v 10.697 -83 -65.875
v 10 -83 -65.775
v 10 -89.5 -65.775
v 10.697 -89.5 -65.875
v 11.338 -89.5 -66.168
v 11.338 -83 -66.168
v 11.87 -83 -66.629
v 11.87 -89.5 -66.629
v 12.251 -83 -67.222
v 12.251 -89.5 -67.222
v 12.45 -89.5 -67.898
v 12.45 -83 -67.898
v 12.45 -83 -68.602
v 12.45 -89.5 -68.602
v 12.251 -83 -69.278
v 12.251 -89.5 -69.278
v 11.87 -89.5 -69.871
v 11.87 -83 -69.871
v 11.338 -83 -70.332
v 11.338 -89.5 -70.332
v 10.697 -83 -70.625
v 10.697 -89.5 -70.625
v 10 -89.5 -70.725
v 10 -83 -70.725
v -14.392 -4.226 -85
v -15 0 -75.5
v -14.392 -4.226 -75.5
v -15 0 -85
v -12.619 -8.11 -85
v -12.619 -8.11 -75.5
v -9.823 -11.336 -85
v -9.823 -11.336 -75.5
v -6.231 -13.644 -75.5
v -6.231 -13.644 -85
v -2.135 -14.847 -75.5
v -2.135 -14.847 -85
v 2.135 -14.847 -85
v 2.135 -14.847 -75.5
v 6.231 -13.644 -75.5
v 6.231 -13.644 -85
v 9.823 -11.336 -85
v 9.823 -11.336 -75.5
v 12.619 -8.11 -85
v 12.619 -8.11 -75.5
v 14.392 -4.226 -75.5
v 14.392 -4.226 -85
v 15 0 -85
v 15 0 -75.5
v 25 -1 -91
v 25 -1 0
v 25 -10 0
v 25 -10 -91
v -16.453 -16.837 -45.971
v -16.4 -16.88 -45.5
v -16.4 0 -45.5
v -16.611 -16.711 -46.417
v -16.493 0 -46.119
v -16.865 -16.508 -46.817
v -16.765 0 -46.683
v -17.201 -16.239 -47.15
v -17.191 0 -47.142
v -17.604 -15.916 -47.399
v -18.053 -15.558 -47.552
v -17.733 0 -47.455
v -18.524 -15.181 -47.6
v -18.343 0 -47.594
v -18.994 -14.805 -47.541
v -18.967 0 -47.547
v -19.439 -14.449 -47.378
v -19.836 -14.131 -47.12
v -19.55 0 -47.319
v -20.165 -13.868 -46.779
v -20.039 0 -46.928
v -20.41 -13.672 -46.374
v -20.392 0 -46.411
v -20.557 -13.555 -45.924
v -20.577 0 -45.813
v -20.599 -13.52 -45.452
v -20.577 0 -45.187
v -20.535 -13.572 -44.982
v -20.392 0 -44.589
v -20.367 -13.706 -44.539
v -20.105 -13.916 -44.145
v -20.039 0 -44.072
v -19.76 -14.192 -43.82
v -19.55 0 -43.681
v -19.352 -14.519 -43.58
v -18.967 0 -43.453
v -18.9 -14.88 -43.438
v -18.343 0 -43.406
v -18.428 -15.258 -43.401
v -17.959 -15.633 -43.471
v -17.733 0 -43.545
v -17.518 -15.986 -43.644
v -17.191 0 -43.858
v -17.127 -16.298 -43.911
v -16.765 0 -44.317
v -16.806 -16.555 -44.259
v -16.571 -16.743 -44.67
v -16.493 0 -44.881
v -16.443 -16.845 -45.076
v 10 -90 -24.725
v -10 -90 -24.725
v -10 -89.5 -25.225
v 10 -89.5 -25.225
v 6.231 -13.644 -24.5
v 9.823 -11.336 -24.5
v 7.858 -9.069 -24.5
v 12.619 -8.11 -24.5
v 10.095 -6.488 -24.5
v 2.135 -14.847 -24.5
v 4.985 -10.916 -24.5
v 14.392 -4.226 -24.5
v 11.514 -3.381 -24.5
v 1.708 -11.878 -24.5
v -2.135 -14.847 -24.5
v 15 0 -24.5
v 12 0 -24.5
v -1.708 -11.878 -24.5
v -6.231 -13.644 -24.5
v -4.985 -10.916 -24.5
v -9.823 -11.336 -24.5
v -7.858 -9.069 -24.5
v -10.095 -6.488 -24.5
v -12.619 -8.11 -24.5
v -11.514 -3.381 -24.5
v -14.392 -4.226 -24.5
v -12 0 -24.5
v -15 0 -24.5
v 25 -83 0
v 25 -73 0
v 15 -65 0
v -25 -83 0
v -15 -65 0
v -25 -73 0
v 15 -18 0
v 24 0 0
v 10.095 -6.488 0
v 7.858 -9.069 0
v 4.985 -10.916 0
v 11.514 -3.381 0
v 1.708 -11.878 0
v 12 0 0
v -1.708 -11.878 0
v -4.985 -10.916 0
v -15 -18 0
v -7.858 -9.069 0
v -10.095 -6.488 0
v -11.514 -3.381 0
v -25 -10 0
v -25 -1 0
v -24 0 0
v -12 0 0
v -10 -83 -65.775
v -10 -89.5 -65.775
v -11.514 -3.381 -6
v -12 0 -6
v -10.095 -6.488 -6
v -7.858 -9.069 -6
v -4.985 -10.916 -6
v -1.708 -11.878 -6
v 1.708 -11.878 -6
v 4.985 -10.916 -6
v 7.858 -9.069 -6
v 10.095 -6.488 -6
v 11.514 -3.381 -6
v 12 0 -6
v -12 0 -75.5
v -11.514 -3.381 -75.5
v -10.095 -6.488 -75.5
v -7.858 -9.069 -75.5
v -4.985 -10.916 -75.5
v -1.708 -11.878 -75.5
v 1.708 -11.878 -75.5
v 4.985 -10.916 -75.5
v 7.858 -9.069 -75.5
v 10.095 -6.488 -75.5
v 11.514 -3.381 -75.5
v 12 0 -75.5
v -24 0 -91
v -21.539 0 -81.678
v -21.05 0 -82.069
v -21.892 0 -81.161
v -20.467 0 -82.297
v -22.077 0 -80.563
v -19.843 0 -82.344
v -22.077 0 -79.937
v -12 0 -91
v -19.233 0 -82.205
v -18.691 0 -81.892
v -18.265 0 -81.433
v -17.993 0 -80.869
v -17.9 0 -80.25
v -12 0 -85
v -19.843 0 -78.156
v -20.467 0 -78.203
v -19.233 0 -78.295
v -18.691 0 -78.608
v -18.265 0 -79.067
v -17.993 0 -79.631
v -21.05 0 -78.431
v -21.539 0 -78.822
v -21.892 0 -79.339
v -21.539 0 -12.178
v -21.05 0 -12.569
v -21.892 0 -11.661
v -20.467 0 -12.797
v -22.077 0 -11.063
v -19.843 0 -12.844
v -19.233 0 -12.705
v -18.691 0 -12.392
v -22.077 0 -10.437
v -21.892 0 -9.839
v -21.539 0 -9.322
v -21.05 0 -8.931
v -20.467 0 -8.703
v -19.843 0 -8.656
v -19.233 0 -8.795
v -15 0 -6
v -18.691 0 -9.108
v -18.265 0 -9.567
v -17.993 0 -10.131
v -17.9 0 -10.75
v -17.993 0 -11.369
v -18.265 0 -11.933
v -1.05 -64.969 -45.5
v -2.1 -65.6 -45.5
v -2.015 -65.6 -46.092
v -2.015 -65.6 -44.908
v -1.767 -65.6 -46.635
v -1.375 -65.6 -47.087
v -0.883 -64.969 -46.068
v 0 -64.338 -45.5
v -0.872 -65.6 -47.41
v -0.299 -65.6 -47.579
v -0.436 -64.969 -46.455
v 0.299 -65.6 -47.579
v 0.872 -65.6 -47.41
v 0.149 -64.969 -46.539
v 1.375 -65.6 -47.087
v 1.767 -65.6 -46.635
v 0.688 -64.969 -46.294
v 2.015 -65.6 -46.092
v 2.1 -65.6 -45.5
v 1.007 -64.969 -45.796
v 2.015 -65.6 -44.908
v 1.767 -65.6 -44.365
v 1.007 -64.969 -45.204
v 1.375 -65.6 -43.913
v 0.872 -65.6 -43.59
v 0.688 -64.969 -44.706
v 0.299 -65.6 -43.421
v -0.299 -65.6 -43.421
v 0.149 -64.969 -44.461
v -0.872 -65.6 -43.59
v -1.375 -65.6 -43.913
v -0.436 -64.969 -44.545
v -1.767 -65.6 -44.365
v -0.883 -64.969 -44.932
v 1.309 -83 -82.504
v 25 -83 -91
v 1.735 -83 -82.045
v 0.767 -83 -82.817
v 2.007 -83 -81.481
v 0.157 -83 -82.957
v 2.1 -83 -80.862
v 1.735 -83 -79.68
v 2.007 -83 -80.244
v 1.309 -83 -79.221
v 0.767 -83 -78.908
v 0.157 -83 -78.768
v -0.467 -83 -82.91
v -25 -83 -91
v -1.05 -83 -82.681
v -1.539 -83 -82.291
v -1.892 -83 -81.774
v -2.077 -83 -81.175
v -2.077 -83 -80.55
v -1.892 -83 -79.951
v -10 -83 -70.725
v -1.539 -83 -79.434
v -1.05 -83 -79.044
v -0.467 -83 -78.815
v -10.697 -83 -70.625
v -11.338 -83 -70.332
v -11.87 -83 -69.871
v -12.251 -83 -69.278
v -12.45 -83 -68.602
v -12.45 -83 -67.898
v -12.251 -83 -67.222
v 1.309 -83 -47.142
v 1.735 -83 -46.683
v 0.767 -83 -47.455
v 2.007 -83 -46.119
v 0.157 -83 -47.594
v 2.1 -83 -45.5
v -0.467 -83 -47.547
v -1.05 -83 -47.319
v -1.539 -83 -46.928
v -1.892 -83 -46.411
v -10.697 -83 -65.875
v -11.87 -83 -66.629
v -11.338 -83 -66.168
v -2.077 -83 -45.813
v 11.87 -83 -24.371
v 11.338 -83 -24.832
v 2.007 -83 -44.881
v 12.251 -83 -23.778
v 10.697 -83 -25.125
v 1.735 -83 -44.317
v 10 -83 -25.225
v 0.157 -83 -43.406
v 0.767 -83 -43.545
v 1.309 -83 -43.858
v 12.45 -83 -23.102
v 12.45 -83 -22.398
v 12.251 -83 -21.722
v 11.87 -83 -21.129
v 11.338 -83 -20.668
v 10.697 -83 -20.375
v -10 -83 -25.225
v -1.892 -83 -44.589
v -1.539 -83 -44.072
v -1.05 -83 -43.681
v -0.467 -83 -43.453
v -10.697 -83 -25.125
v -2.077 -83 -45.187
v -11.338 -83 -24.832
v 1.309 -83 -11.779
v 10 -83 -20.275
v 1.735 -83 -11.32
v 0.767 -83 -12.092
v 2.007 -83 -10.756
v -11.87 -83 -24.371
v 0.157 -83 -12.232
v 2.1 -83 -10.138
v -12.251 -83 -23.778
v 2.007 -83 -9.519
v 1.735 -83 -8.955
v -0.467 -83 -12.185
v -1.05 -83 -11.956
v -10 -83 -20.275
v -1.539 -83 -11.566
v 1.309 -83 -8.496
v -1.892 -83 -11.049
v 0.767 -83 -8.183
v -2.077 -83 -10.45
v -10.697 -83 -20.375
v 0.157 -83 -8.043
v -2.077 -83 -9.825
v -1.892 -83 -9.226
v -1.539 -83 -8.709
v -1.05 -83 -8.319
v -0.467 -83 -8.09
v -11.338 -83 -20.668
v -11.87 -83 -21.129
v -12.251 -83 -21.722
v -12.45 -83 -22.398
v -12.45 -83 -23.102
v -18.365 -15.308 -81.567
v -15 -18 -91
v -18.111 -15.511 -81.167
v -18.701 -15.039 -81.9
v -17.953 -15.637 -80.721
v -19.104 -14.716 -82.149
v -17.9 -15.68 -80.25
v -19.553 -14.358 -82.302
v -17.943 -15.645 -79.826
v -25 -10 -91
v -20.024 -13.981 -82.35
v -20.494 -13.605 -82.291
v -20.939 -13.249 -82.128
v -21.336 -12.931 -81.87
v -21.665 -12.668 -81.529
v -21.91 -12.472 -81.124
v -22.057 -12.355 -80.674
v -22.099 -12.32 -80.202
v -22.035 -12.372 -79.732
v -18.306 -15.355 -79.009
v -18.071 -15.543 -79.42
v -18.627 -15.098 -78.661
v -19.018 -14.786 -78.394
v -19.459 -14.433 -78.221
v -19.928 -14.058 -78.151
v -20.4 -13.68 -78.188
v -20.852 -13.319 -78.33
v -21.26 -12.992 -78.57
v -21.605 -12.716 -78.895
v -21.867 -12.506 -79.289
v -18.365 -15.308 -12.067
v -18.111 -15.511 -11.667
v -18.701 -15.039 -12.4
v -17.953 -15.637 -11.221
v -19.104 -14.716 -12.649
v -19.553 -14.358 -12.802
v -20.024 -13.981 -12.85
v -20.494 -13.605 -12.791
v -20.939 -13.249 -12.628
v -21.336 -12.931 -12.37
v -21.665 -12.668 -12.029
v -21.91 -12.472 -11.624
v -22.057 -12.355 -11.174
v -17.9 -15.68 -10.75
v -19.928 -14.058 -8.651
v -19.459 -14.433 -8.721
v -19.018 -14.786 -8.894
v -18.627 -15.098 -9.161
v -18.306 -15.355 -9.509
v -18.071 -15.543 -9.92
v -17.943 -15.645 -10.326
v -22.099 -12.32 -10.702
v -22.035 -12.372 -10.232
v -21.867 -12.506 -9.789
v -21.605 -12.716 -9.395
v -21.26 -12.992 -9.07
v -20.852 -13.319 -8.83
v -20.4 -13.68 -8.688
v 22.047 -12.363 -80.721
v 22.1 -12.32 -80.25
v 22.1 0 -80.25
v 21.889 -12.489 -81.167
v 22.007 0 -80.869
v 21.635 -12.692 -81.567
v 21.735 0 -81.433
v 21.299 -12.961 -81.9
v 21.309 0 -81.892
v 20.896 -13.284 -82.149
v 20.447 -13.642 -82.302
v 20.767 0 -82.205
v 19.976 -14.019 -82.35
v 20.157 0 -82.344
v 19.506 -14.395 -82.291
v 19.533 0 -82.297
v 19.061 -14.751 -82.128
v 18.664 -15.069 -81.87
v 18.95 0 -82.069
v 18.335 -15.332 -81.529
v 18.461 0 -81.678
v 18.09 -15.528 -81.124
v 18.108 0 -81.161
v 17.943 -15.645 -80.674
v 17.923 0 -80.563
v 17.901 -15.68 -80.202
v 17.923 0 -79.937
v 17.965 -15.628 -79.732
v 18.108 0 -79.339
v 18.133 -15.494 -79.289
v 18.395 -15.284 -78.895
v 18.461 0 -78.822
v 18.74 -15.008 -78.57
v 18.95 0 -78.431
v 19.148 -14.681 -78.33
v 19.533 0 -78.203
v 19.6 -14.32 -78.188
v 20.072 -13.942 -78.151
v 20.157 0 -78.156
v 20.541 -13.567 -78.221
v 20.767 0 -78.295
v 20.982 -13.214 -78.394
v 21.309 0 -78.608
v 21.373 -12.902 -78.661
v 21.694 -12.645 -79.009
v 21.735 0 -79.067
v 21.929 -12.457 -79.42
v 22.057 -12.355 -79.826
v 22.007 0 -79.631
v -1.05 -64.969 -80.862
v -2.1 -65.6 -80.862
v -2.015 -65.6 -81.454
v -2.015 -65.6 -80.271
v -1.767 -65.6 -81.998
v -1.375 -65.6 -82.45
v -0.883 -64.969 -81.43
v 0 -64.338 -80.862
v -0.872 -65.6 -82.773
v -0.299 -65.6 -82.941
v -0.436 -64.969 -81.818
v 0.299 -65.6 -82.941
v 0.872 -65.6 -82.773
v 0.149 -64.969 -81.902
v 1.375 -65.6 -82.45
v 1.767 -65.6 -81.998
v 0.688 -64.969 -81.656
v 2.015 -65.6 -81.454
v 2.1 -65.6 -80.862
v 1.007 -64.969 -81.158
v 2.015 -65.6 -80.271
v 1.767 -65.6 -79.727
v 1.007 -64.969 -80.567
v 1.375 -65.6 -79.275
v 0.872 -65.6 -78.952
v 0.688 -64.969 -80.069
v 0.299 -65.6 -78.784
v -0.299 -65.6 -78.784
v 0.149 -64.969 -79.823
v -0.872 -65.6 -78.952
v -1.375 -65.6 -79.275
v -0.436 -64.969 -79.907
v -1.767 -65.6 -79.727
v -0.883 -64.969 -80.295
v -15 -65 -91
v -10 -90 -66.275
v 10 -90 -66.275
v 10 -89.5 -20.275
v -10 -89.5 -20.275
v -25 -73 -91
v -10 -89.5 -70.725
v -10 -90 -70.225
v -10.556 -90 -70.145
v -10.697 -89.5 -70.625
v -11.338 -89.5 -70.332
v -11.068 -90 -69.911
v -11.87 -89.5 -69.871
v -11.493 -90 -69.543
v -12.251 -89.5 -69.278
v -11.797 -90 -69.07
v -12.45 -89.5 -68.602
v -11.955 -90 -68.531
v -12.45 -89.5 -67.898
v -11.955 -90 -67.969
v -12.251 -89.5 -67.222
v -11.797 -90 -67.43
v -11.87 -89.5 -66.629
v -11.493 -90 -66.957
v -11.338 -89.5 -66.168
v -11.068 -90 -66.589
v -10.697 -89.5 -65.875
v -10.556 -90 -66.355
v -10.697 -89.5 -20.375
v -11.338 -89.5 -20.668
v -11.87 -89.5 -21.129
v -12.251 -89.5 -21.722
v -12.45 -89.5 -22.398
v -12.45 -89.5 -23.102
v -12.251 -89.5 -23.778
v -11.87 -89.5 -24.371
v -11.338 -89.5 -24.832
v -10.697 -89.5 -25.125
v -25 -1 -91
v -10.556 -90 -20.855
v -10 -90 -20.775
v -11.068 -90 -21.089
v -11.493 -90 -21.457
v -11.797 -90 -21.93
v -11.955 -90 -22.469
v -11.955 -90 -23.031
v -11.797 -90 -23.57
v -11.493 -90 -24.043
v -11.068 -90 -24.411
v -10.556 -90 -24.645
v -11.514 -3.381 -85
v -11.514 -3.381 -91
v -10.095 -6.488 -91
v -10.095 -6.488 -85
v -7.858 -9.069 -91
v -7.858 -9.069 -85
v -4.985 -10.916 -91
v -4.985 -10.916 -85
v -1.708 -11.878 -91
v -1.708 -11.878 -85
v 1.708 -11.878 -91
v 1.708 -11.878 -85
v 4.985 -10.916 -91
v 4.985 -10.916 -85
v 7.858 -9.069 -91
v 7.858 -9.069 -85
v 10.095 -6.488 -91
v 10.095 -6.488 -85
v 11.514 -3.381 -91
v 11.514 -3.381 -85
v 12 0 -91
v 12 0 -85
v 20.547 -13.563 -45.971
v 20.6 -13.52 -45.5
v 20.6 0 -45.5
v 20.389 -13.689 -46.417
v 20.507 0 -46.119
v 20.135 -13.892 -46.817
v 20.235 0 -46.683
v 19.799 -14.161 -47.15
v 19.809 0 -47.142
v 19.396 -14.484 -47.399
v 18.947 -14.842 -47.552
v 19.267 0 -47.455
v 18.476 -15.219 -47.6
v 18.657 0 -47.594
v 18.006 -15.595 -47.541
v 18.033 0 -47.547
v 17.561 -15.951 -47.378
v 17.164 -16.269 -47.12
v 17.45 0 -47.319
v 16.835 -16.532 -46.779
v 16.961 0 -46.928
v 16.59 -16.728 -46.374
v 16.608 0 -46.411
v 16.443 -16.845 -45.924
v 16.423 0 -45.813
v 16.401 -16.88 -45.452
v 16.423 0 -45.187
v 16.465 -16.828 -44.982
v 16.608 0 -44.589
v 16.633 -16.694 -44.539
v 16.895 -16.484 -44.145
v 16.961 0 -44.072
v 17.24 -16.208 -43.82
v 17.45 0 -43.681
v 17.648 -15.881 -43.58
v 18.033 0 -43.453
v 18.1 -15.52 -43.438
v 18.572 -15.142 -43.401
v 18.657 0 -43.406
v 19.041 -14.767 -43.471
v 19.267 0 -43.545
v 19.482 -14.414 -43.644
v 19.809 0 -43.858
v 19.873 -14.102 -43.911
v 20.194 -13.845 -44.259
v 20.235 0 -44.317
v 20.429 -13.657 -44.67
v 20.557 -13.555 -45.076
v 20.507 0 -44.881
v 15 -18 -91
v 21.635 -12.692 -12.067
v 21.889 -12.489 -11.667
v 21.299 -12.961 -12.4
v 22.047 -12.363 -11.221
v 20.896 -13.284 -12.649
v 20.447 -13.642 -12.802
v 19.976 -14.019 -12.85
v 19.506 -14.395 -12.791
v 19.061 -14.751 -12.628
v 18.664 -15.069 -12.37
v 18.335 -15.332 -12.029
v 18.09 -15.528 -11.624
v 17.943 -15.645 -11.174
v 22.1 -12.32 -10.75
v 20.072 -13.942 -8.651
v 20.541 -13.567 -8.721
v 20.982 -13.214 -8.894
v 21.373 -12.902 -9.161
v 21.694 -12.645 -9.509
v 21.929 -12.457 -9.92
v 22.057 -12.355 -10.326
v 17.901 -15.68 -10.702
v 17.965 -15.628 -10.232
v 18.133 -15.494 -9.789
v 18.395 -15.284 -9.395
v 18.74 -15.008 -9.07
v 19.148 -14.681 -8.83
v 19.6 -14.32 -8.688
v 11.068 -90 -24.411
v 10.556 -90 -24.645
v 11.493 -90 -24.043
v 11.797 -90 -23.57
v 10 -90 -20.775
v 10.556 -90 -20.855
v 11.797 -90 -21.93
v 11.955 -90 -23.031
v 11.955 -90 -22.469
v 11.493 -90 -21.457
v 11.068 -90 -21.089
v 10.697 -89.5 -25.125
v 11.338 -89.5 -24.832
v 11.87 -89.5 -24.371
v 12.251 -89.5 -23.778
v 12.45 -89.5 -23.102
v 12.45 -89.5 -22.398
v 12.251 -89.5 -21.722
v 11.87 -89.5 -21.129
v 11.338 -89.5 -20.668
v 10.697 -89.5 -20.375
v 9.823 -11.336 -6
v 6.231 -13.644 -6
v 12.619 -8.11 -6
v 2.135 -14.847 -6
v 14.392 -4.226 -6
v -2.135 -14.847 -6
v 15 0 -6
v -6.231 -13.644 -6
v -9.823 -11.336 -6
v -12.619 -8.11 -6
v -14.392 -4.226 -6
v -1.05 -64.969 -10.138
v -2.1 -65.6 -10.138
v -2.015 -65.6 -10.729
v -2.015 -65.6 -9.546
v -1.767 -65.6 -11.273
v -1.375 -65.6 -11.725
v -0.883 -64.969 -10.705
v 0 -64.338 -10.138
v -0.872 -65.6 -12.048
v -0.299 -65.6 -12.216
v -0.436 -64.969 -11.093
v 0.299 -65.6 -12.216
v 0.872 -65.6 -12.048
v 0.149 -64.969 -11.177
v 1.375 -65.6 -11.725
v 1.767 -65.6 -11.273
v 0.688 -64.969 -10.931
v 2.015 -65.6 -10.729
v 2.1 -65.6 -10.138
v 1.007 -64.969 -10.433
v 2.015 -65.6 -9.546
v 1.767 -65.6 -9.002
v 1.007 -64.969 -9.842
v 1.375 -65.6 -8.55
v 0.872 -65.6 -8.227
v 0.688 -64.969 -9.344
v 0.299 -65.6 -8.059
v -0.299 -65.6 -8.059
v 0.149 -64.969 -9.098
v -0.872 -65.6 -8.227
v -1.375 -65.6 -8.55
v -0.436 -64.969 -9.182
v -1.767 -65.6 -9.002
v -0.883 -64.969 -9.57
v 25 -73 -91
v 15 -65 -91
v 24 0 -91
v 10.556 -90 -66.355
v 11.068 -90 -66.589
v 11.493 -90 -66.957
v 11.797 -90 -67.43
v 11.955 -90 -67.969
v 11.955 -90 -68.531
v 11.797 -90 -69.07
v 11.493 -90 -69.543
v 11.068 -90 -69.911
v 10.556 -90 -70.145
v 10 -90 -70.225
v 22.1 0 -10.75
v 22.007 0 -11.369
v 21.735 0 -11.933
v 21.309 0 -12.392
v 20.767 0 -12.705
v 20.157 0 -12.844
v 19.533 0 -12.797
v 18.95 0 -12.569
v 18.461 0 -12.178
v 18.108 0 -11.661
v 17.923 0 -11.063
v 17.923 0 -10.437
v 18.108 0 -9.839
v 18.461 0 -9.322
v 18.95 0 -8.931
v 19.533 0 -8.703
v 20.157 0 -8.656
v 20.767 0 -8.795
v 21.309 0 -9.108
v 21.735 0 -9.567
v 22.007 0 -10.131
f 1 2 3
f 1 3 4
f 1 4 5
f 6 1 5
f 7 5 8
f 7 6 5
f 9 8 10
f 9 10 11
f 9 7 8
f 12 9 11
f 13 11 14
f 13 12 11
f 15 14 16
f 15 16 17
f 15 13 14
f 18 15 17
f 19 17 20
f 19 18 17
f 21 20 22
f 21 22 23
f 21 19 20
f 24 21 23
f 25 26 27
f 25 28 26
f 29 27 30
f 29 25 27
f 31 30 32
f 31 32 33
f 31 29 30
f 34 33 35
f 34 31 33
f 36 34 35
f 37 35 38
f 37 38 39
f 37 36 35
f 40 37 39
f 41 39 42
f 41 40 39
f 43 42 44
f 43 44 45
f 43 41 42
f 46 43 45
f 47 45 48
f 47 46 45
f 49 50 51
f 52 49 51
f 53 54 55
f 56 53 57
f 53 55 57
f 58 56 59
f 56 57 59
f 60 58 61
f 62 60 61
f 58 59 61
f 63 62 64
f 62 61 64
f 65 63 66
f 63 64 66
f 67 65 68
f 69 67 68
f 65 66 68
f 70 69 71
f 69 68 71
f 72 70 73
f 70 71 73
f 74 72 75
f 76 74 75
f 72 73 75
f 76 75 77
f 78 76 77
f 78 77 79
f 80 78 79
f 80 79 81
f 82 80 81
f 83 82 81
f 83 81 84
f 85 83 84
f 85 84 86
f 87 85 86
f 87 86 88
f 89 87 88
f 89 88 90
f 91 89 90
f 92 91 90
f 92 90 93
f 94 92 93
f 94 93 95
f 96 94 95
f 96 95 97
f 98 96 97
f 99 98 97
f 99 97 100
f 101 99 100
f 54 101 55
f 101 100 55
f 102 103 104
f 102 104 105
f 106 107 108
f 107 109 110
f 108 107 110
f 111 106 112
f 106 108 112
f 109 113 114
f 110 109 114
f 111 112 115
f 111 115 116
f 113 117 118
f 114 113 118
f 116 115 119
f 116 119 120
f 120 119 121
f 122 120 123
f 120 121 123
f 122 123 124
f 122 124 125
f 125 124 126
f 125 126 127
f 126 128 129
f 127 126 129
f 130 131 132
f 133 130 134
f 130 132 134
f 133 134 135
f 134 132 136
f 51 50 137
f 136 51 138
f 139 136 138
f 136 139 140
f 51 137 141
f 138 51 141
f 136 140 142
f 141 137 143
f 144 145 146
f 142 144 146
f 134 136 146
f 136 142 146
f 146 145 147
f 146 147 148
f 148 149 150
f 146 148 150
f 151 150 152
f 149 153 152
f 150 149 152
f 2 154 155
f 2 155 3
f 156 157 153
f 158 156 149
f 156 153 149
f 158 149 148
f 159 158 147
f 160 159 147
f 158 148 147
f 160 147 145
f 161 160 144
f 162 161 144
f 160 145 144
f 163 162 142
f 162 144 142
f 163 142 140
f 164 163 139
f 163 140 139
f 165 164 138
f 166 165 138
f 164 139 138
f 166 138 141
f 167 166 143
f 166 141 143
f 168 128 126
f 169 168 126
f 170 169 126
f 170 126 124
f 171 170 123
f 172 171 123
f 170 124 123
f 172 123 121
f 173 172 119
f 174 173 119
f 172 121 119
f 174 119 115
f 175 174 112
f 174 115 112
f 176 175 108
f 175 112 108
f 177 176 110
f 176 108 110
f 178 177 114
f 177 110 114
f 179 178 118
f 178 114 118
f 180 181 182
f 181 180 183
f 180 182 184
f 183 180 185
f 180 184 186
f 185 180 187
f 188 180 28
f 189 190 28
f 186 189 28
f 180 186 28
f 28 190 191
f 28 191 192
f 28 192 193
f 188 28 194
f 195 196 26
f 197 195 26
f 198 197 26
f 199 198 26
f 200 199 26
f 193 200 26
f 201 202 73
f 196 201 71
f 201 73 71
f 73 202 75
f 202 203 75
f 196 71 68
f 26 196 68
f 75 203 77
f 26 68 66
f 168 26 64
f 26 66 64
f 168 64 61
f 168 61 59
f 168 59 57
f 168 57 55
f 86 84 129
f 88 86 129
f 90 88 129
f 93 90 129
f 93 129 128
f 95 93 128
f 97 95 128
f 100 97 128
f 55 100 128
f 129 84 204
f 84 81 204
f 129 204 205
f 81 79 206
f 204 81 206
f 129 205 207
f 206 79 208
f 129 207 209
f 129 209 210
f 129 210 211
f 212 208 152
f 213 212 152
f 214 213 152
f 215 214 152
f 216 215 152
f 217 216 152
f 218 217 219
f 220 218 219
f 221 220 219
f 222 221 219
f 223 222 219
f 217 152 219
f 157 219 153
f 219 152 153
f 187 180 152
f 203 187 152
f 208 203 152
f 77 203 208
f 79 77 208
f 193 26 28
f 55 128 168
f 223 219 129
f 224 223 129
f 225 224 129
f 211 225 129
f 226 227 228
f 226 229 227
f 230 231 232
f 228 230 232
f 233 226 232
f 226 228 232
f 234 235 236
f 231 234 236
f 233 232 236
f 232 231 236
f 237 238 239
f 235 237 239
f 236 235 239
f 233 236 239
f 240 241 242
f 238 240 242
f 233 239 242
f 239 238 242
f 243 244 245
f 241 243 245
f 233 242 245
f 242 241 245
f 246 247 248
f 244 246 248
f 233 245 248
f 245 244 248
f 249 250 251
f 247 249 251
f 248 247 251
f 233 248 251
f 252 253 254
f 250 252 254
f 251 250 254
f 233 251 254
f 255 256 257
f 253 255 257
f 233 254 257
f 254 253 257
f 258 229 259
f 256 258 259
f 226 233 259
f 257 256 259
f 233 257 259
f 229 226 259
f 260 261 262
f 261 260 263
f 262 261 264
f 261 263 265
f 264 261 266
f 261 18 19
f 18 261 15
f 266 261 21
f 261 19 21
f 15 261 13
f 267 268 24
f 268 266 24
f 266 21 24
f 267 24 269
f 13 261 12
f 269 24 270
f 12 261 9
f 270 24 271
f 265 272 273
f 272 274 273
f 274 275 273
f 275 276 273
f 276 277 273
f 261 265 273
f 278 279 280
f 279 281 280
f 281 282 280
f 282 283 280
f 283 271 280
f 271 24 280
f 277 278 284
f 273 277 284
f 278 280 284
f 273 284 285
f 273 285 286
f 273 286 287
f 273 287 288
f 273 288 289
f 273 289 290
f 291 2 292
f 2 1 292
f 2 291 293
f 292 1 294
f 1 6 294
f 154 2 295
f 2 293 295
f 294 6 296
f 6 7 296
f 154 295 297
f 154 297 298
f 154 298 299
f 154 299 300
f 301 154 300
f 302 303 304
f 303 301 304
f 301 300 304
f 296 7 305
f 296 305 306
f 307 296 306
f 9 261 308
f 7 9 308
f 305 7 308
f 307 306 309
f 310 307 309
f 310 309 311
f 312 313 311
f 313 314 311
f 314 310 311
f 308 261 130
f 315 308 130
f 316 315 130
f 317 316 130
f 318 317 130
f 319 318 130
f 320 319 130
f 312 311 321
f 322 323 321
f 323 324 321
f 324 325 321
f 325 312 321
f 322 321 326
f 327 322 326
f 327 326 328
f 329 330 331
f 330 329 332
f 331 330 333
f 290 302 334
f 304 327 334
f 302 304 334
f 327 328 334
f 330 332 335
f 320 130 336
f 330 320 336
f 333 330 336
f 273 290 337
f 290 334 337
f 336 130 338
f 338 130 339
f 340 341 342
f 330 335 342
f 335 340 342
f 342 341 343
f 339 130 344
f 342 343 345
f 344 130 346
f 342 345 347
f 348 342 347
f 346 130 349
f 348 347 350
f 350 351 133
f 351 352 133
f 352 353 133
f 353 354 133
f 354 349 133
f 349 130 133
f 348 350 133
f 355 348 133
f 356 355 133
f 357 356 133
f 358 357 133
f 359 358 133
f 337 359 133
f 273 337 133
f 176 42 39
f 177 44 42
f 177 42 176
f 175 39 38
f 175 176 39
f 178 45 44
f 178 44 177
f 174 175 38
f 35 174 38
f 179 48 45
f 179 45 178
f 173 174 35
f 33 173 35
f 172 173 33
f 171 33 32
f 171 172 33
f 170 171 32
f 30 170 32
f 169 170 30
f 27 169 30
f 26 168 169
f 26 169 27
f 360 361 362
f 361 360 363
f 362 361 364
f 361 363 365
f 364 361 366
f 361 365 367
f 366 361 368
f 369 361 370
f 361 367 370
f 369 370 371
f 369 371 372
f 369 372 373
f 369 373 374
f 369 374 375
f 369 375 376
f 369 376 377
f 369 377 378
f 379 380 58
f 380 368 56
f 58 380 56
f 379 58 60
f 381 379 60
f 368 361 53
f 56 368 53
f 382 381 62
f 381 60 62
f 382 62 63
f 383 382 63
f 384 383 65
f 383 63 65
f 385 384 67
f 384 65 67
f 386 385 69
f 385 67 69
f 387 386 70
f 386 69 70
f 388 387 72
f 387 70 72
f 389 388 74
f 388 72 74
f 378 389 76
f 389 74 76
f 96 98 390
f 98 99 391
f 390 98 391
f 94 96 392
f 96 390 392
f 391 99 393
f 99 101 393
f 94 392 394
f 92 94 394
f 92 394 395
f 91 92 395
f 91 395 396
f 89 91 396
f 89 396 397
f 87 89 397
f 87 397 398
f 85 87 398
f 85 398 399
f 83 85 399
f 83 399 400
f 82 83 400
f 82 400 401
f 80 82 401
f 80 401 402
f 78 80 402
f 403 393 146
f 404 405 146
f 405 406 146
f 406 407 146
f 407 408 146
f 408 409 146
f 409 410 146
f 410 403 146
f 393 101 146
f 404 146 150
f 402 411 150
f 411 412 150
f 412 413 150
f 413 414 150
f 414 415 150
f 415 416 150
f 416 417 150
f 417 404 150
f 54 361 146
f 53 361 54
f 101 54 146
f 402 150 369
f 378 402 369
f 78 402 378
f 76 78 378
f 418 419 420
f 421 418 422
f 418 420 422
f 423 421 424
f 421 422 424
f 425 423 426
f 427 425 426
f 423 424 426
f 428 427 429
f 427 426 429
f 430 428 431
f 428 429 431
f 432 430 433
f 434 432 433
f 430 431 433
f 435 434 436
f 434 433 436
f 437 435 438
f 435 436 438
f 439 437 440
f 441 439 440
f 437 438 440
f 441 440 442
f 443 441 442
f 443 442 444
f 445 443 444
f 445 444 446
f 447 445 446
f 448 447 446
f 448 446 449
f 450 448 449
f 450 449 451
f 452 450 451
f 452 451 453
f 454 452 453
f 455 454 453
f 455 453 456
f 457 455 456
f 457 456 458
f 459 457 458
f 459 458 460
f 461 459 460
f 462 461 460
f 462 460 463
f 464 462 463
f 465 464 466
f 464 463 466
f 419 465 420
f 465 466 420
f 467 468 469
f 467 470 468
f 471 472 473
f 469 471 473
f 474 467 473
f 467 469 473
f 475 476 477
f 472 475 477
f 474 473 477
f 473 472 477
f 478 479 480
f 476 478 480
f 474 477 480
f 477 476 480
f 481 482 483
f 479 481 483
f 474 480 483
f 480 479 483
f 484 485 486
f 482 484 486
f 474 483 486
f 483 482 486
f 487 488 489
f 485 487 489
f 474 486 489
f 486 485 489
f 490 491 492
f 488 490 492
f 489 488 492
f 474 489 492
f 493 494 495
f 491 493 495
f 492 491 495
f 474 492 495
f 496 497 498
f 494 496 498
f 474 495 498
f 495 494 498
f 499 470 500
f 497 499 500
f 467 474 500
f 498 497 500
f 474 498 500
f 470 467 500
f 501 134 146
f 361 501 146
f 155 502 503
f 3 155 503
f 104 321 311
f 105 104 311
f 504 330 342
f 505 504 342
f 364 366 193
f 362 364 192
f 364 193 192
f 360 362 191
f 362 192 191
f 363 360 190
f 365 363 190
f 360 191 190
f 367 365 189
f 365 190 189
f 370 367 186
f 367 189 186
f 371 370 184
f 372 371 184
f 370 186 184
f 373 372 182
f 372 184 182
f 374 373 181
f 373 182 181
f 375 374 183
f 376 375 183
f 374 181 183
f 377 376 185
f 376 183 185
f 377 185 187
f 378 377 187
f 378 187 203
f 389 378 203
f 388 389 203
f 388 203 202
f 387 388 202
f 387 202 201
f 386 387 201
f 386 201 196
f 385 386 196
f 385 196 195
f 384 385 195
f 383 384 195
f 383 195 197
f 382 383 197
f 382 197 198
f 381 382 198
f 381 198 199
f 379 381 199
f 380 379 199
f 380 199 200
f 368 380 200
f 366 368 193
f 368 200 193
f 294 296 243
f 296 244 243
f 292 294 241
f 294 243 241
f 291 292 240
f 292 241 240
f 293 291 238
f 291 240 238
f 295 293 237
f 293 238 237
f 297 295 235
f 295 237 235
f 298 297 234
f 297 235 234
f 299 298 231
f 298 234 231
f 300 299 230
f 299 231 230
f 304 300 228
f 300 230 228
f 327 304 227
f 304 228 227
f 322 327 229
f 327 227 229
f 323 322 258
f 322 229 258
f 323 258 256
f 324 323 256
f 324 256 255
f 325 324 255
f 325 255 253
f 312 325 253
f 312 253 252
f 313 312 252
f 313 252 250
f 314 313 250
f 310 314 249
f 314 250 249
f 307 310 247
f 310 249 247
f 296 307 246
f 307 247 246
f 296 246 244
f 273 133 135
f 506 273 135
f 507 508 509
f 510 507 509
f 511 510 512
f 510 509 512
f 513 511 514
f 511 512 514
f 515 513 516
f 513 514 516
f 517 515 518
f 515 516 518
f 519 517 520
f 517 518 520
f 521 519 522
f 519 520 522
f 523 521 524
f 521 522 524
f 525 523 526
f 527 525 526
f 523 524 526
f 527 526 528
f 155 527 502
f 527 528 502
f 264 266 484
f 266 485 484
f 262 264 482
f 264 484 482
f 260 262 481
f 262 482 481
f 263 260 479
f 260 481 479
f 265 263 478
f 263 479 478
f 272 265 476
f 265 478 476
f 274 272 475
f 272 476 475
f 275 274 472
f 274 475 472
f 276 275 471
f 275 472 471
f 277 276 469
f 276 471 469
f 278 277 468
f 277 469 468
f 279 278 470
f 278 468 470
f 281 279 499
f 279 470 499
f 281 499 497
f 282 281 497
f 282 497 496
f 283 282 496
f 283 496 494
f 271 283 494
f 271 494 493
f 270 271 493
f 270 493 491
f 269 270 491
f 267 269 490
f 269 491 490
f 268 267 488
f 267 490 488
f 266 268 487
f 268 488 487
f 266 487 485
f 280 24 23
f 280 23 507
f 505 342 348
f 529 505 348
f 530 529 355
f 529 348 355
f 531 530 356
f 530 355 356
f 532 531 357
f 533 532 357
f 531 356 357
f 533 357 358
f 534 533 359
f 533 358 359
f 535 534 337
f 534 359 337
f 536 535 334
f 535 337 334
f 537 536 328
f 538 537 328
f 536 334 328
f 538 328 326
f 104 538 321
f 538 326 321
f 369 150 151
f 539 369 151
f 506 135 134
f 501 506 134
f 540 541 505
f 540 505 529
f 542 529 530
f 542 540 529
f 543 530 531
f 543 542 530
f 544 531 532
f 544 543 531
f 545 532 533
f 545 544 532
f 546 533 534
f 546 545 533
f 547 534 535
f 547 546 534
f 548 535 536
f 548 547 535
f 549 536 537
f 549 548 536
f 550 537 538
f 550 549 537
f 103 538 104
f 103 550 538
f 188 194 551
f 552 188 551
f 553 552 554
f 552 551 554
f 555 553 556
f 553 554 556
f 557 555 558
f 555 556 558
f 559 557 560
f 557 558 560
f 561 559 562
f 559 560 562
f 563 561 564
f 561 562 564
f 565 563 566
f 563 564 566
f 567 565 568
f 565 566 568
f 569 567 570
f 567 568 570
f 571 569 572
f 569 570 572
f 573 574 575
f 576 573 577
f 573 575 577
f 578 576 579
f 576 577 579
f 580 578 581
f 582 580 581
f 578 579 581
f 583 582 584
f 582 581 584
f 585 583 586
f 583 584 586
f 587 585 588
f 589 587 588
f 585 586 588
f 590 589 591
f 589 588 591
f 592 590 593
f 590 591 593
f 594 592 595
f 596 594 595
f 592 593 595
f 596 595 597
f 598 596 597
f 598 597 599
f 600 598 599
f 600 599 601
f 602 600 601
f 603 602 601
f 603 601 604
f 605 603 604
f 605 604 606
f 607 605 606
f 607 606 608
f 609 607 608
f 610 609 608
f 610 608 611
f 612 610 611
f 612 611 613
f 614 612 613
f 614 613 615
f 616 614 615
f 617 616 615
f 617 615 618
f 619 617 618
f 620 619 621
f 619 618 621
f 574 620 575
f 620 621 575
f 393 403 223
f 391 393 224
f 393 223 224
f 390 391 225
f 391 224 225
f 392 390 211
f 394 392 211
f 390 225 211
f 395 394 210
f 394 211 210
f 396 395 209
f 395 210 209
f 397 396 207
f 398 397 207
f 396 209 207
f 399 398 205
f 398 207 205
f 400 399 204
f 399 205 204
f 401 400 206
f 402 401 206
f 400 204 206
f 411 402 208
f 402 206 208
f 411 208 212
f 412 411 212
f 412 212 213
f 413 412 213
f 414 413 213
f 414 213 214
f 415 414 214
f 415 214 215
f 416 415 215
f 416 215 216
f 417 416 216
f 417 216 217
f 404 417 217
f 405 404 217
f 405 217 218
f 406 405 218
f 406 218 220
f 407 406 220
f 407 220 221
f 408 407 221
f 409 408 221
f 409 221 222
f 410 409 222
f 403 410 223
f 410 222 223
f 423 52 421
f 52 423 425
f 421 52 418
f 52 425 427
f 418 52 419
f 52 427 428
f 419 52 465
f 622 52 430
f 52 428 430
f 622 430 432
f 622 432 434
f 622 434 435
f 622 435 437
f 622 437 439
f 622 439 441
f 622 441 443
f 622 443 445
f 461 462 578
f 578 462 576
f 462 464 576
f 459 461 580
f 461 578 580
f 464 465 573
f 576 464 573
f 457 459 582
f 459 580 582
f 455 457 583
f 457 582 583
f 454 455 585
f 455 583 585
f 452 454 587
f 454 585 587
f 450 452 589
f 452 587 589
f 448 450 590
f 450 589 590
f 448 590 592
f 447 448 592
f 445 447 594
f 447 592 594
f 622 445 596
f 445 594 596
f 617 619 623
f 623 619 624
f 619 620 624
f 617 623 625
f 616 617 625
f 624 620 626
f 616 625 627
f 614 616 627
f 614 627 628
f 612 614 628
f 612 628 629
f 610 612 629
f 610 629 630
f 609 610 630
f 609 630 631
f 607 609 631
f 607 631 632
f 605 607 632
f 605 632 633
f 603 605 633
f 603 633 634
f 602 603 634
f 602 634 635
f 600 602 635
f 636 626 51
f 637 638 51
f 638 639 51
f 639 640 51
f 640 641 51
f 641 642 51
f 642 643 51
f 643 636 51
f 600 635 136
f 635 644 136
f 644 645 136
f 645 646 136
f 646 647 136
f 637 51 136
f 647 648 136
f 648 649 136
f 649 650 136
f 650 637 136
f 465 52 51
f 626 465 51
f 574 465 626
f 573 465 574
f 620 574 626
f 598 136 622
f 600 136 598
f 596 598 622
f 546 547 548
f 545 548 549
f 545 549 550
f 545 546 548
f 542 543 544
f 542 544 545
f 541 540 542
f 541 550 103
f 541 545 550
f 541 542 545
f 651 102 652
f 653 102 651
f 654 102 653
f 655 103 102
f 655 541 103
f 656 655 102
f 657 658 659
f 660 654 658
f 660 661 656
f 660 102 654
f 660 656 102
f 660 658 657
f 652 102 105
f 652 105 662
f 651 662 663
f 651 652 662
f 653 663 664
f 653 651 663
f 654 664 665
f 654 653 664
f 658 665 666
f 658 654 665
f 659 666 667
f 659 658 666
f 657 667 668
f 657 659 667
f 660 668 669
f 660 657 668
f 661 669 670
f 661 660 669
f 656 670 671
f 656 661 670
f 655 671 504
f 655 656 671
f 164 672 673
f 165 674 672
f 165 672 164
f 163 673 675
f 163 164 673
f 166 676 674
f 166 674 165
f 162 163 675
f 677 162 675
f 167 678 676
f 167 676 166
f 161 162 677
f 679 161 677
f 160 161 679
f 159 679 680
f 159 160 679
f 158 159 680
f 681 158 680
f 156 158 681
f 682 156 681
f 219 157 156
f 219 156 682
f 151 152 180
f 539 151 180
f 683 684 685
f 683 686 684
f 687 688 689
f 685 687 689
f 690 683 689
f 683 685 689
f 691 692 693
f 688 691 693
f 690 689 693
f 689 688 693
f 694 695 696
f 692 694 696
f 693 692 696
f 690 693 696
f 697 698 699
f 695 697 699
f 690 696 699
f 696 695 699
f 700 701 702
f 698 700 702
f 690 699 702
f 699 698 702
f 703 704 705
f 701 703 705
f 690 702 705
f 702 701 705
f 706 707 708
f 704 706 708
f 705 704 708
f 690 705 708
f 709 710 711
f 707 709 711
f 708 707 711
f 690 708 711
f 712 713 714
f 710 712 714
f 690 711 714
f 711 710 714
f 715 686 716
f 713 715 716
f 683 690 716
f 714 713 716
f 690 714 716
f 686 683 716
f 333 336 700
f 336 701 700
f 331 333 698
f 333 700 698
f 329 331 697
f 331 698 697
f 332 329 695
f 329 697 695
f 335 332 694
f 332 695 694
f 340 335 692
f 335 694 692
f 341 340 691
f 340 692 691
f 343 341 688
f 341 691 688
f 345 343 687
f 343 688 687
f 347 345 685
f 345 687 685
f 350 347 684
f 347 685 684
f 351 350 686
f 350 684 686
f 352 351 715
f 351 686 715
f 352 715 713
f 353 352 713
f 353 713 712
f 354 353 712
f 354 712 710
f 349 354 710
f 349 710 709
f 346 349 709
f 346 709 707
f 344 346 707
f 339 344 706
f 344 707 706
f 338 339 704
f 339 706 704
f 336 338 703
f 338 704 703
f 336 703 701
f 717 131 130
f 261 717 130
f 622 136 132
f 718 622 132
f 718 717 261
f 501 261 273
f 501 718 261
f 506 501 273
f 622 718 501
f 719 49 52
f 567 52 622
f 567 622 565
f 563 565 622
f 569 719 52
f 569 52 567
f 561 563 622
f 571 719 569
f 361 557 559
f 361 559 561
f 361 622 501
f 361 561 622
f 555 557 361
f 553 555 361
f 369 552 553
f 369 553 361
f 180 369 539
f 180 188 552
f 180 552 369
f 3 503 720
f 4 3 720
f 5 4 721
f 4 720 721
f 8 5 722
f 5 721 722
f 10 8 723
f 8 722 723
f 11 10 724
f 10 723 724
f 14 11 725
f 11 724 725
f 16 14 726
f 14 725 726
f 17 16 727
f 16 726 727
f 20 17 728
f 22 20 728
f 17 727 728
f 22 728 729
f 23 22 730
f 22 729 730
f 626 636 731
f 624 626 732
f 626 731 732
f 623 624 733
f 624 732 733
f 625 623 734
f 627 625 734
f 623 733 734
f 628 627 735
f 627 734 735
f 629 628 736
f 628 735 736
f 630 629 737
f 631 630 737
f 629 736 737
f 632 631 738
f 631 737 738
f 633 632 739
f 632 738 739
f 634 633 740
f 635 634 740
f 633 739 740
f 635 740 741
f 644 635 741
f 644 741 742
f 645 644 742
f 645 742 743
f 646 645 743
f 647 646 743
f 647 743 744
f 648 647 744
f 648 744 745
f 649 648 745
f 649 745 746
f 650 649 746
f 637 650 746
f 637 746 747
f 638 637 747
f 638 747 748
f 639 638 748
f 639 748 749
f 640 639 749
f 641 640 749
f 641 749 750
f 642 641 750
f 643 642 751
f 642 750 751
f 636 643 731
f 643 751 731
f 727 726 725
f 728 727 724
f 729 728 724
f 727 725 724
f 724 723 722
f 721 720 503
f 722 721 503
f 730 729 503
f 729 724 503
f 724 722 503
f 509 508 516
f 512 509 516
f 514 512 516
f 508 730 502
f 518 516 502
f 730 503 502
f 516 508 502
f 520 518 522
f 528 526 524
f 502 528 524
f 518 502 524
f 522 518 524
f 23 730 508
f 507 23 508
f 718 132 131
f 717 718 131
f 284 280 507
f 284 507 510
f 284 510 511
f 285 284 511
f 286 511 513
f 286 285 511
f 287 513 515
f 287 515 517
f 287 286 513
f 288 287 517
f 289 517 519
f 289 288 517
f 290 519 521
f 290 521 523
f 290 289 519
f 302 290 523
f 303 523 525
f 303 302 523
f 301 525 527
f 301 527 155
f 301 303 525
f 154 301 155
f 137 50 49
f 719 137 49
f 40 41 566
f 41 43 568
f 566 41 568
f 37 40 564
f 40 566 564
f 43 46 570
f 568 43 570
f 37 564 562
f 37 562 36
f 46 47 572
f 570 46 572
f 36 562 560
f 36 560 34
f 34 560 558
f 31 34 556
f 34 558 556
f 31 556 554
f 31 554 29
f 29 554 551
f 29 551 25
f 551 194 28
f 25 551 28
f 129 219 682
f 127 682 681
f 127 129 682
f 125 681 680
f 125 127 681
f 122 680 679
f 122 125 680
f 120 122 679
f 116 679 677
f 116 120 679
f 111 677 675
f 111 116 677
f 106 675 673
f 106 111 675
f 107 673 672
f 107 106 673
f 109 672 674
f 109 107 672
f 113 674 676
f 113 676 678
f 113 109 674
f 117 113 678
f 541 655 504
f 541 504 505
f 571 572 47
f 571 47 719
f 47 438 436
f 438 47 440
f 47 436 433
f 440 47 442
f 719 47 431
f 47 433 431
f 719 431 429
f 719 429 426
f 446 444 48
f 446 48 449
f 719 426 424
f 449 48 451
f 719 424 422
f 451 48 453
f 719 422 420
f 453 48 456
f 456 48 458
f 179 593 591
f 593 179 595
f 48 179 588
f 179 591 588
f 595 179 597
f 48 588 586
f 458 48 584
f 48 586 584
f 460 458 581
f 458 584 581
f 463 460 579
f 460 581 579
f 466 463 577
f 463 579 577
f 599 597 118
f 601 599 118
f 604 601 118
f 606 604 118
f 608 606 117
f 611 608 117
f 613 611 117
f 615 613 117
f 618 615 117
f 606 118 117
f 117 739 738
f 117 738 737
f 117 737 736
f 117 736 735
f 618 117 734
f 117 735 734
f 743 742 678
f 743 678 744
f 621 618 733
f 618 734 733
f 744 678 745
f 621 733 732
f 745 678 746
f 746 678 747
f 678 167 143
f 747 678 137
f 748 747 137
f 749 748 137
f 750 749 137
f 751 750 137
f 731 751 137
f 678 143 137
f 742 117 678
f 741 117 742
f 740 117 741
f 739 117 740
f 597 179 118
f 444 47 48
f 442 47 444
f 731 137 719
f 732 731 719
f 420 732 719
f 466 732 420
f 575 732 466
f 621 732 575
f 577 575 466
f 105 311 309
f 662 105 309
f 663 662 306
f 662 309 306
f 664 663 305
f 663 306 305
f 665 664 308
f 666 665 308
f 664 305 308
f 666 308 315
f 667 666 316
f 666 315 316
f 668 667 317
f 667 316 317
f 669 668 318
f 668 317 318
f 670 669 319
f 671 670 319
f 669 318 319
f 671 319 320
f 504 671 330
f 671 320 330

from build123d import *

# Parameters (mm, degrees)
BOSS_EXTRUDE1_DEPTH = 91
SKETCH8_W           = 3
SKETCH8_H           = 9.5
SKETCH8_H_2         = 18.5
M5X0_81_REACH       = 127.678
M5X0_81_BORE_R      = 2.1
BOSS_EXTRUDE2_DEPTH = 7
CHAMFER1_SIZE       = 0.5
CHAMFER_1_SIZE      = 1
M5X0_82_D           = 4.2
M5X0_82_DEPTH       = 17.4
M5X0_82_TIP         = 1.2618073


with BuildPart() as part:
    # Sketch1 → Boss-Extrude1 (new body)
    with BuildSketch(Plane.XY):
        with BuildLine():
            Line((12, 0), (25, 0))
            Line((25, 0), (25, -10))
            Line((25, -10), (15, -18))
            Line((15, -18), (15, -65))
            Line((15, -65), (25, -73))
            Line((25, -73), (25, -83))
            Line((25, -83), (-25, -83))
            Line((-25, -83), (-25, -73))
            Line((-25, -73), (-15, -65))
            Line((-15, -65), (-15, -18))
            Line((-15, -18), (-25, -10))
            Line((-25, -10), (-25, 0))
            Line((-25, 0), (-12, 0))
            ThreePointArc((-12, 0), (0, -12), (12, 0))
        make_face()
    extrude(amount=-BOSS_EXTRUDE1_DEPTH)

    # Sketch8 → Cut-Revolve2 (revolve, cut)
    with BuildSketch(Plane(origin=(0, 0, 0), x_dir=(1, 0, 0), z_dir=(0, 1, 0))):
        with Locations((13.5, 80.25)):
            Rectangle(SKETCH8_W, SKETCH8_H)
        with Locations((13.5, 15.25)):
            Rectangle(SKETCH8_W, SKETCH8_H_2)
    revolve(axis=Axis((0, 0, -91), (0, 0, 1)), mode=Mode.SUBTRACT)

    # Отверстие обработанное метчиком M5x0.81 bore → Отверстие обработанное метчиком M5x0.81 (cut, up to next)
    with BuildSketch(Plane(origin=(0, 0, 0), x_dir=(1, 0, 0), z_dir=(0, 1, 0)), mode=Mode.PRIVATE) as m5x0_81_sk1:
        with Locations((-20, 10.75)):
            Circle(M5X0_81_BORE_R)
    m5x0_81_tool1 = extrude(m5x0_81_sk1.sketch, amount=-M5X0_81_REACH, mode=Mode.PRIVATE) & part.part
    # Отверстие обработанное метчиком M5x0.81 bore → Отверстие обработанное метчиком M5x0.81 (cut, up to next)
    with BuildSketch(Plane(origin=(0, 0, 0), x_dir=(1, 0, 0), z_dir=(0, 1, 0)), mode=Mode.PRIVATE) as m5x0_81_sk2:
        with Locations((20, 10.75)):
            Circle(M5X0_81_BORE_R)
    m5x0_81_tool2 = extrude(m5x0_81_sk2.sketch, amount=-M5X0_81_REACH, mode=Mode.PRIVATE) & part.part
    # Отверстие обработанное метчиком M5x0.81 bore → Отверстие обработанное метчиком M5x0.81 (cut, up to next)
    with BuildSketch(Plane(origin=(0, 0, 0), x_dir=(1, 0, 0), z_dir=(0, 1, 0)), mode=Mode.PRIVATE) as m5x0_81_sk3:
        with Locations((-20, 80.25)):
            Circle(M5X0_81_BORE_R)
    m5x0_81_tool3 = extrude(m5x0_81_sk3.sketch, amount=-M5X0_81_REACH, mode=Mode.PRIVATE) & part.part
    # Отверстие обработанное метчиком M5x0.81 bore → Отверстие обработанное метчиком M5x0.81 (cut, up to next)
    with BuildSketch(Plane(origin=(0, 0, 0), x_dir=(1, 0, 0), z_dir=(0, 1, 0)), mode=Mode.PRIVATE) as m5x0_81_sk4:
        with Locations((20, 80.25)):
            Circle(M5X0_81_BORE_R)
    m5x0_81_tool4 = extrude(m5x0_81_sk4.sketch, amount=-M5X0_81_REACH, mode=Mode.PRIVATE) & part.part
    # Отверстие обработанное метчиком M5x0.81 bore → Отверстие обработанное метчиком M5x0.81 (cut, up to next)
    with BuildSketch(Plane(origin=(0, 0, 0), x_dir=(1, 0, 0), z_dir=(0, 1, 0)), mode=Mode.PRIVATE) as m5x0_81_sk5:
        with Locations((-18.5, 45.5)):
            Circle(M5X0_81_BORE_R)
    m5x0_81_tool5 = extrude(m5x0_81_sk5.sketch, amount=-M5X0_81_REACH, mode=Mode.PRIVATE) & part.part
    # Отверстие обработанное метчиком M5x0.81 bore → Отверстие обработанное метчиком M5x0.81 (cut, up to next)
    with BuildSketch(Plane(origin=(0, 0, 0), x_dir=(1, 0, 0), z_dir=(0, 1, 0)), mode=Mode.PRIVATE) as m5x0_81_sk6:
        with Locations((18.5, 45.5)):
            Circle(M5X0_81_BORE_R)
    m5x0_81_tool6 = extrude(m5x0_81_sk6.sketch, amount=-M5X0_81_REACH, mode=Mode.PRIVATE) & part.part
    add(m5x0_81_tool1.solids().sort_by_distance((-20, 0, -10.75))[0], mode=Mode.SUBTRACT)
    add(m5x0_81_tool2.solids().sort_by_distance((20, 0, -10.75))[0], mode=Mode.SUBTRACT)
    add(m5x0_81_tool3.solids().sort_by_distance((-20, 0, -80.25))[0], mode=Mode.SUBTRACT)
    add(m5x0_81_tool4.solids().sort_by_distance((20, 0, -80.25))[0], mode=Mode.SUBTRACT)
    add(m5x0_81_tool5.solids().sort_by_distance((-18.5, 0, -45.5))[0], mode=Mode.SUBTRACT)
    add(m5x0_81_tool6.solids().sort_by_distance((18.5, 0, -45.5))[0], mode=Mode.SUBTRACT)

    # Sketch9 → Boss-Extrude2 (add)
    with BuildSketch(Plane.XZ.offset(83)):
        with BuildLine():
            Line((-10, -25.225), (10, -25.225))
            ThreePointArc((10, -25.225), (12.475, -22.75), (10, -20.275))
            Line((10, -20.275), (-10, -20.275))
            ThreePointArc((-10, -20.275), (-12.475, -22.75), (-10, -25.225))
        make_face()
        with BuildLine():
            Line((-10, -65.775), (10, -65.775))
            ThreePointArc((10, -65.775), (12.475, -68.25), (10, -70.725))
            Line((10, -70.725), (-10, -70.725))
            ThreePointArc((-10, -70.725), (-12.475, -68.25), (-10, -65.775))
        make_face()
    extrude(amount=BOSS_EXTRUDE2_DEPTH)

    # Chamfer1
    chamfer1_edges = [part.edges().sort_by_distance(p)[0] for p in [
        (12.475, -90, -22.75),
        (0, -90, -20.275),
        (-12.475, -90, -22.75),
        (0, -90, -25.225),
        (12.475, -90, -68.25),
        (0, -90, -65.775),
        (-12.475, -90, -68.25),
        (0, -90, -70.725),
    ]]
    chamfer(chamfer1_edges, length=CHAMFER1_SIZE)

    # Фаска1
    chamfer_1_edges = [part.edges().sort_by_distance(p)[0] for p in [
        (-25, 0, -45.5),
        (25, 0, -45.5),
    ]]
    chamfer(chamfer_1_edges, length=CHAMFER_1_SIZE)

    # Отверстие обработанное метчиком M5x0.82
    with Locations(Plane(origin=(0, -83, 0), x_dir=(-1, 0, 0), z_dir=(0, -1, 0))):
        with Locations((0, 45.5), (0, 10.1375), (0, 80.8625)):
            Hole(M5X0_82_D / 2, depth=M5X0_82_DEPTH)
            with Locations((0, 0, -(M5X0_82_DEPTH + M5X0_82_TIP / 2))):  # 118° drill point
                Cone(0, M5X0_82_D / 2, M5X0_82_TIP, mode=Mode.SUBTRACT)


solid = part.part
